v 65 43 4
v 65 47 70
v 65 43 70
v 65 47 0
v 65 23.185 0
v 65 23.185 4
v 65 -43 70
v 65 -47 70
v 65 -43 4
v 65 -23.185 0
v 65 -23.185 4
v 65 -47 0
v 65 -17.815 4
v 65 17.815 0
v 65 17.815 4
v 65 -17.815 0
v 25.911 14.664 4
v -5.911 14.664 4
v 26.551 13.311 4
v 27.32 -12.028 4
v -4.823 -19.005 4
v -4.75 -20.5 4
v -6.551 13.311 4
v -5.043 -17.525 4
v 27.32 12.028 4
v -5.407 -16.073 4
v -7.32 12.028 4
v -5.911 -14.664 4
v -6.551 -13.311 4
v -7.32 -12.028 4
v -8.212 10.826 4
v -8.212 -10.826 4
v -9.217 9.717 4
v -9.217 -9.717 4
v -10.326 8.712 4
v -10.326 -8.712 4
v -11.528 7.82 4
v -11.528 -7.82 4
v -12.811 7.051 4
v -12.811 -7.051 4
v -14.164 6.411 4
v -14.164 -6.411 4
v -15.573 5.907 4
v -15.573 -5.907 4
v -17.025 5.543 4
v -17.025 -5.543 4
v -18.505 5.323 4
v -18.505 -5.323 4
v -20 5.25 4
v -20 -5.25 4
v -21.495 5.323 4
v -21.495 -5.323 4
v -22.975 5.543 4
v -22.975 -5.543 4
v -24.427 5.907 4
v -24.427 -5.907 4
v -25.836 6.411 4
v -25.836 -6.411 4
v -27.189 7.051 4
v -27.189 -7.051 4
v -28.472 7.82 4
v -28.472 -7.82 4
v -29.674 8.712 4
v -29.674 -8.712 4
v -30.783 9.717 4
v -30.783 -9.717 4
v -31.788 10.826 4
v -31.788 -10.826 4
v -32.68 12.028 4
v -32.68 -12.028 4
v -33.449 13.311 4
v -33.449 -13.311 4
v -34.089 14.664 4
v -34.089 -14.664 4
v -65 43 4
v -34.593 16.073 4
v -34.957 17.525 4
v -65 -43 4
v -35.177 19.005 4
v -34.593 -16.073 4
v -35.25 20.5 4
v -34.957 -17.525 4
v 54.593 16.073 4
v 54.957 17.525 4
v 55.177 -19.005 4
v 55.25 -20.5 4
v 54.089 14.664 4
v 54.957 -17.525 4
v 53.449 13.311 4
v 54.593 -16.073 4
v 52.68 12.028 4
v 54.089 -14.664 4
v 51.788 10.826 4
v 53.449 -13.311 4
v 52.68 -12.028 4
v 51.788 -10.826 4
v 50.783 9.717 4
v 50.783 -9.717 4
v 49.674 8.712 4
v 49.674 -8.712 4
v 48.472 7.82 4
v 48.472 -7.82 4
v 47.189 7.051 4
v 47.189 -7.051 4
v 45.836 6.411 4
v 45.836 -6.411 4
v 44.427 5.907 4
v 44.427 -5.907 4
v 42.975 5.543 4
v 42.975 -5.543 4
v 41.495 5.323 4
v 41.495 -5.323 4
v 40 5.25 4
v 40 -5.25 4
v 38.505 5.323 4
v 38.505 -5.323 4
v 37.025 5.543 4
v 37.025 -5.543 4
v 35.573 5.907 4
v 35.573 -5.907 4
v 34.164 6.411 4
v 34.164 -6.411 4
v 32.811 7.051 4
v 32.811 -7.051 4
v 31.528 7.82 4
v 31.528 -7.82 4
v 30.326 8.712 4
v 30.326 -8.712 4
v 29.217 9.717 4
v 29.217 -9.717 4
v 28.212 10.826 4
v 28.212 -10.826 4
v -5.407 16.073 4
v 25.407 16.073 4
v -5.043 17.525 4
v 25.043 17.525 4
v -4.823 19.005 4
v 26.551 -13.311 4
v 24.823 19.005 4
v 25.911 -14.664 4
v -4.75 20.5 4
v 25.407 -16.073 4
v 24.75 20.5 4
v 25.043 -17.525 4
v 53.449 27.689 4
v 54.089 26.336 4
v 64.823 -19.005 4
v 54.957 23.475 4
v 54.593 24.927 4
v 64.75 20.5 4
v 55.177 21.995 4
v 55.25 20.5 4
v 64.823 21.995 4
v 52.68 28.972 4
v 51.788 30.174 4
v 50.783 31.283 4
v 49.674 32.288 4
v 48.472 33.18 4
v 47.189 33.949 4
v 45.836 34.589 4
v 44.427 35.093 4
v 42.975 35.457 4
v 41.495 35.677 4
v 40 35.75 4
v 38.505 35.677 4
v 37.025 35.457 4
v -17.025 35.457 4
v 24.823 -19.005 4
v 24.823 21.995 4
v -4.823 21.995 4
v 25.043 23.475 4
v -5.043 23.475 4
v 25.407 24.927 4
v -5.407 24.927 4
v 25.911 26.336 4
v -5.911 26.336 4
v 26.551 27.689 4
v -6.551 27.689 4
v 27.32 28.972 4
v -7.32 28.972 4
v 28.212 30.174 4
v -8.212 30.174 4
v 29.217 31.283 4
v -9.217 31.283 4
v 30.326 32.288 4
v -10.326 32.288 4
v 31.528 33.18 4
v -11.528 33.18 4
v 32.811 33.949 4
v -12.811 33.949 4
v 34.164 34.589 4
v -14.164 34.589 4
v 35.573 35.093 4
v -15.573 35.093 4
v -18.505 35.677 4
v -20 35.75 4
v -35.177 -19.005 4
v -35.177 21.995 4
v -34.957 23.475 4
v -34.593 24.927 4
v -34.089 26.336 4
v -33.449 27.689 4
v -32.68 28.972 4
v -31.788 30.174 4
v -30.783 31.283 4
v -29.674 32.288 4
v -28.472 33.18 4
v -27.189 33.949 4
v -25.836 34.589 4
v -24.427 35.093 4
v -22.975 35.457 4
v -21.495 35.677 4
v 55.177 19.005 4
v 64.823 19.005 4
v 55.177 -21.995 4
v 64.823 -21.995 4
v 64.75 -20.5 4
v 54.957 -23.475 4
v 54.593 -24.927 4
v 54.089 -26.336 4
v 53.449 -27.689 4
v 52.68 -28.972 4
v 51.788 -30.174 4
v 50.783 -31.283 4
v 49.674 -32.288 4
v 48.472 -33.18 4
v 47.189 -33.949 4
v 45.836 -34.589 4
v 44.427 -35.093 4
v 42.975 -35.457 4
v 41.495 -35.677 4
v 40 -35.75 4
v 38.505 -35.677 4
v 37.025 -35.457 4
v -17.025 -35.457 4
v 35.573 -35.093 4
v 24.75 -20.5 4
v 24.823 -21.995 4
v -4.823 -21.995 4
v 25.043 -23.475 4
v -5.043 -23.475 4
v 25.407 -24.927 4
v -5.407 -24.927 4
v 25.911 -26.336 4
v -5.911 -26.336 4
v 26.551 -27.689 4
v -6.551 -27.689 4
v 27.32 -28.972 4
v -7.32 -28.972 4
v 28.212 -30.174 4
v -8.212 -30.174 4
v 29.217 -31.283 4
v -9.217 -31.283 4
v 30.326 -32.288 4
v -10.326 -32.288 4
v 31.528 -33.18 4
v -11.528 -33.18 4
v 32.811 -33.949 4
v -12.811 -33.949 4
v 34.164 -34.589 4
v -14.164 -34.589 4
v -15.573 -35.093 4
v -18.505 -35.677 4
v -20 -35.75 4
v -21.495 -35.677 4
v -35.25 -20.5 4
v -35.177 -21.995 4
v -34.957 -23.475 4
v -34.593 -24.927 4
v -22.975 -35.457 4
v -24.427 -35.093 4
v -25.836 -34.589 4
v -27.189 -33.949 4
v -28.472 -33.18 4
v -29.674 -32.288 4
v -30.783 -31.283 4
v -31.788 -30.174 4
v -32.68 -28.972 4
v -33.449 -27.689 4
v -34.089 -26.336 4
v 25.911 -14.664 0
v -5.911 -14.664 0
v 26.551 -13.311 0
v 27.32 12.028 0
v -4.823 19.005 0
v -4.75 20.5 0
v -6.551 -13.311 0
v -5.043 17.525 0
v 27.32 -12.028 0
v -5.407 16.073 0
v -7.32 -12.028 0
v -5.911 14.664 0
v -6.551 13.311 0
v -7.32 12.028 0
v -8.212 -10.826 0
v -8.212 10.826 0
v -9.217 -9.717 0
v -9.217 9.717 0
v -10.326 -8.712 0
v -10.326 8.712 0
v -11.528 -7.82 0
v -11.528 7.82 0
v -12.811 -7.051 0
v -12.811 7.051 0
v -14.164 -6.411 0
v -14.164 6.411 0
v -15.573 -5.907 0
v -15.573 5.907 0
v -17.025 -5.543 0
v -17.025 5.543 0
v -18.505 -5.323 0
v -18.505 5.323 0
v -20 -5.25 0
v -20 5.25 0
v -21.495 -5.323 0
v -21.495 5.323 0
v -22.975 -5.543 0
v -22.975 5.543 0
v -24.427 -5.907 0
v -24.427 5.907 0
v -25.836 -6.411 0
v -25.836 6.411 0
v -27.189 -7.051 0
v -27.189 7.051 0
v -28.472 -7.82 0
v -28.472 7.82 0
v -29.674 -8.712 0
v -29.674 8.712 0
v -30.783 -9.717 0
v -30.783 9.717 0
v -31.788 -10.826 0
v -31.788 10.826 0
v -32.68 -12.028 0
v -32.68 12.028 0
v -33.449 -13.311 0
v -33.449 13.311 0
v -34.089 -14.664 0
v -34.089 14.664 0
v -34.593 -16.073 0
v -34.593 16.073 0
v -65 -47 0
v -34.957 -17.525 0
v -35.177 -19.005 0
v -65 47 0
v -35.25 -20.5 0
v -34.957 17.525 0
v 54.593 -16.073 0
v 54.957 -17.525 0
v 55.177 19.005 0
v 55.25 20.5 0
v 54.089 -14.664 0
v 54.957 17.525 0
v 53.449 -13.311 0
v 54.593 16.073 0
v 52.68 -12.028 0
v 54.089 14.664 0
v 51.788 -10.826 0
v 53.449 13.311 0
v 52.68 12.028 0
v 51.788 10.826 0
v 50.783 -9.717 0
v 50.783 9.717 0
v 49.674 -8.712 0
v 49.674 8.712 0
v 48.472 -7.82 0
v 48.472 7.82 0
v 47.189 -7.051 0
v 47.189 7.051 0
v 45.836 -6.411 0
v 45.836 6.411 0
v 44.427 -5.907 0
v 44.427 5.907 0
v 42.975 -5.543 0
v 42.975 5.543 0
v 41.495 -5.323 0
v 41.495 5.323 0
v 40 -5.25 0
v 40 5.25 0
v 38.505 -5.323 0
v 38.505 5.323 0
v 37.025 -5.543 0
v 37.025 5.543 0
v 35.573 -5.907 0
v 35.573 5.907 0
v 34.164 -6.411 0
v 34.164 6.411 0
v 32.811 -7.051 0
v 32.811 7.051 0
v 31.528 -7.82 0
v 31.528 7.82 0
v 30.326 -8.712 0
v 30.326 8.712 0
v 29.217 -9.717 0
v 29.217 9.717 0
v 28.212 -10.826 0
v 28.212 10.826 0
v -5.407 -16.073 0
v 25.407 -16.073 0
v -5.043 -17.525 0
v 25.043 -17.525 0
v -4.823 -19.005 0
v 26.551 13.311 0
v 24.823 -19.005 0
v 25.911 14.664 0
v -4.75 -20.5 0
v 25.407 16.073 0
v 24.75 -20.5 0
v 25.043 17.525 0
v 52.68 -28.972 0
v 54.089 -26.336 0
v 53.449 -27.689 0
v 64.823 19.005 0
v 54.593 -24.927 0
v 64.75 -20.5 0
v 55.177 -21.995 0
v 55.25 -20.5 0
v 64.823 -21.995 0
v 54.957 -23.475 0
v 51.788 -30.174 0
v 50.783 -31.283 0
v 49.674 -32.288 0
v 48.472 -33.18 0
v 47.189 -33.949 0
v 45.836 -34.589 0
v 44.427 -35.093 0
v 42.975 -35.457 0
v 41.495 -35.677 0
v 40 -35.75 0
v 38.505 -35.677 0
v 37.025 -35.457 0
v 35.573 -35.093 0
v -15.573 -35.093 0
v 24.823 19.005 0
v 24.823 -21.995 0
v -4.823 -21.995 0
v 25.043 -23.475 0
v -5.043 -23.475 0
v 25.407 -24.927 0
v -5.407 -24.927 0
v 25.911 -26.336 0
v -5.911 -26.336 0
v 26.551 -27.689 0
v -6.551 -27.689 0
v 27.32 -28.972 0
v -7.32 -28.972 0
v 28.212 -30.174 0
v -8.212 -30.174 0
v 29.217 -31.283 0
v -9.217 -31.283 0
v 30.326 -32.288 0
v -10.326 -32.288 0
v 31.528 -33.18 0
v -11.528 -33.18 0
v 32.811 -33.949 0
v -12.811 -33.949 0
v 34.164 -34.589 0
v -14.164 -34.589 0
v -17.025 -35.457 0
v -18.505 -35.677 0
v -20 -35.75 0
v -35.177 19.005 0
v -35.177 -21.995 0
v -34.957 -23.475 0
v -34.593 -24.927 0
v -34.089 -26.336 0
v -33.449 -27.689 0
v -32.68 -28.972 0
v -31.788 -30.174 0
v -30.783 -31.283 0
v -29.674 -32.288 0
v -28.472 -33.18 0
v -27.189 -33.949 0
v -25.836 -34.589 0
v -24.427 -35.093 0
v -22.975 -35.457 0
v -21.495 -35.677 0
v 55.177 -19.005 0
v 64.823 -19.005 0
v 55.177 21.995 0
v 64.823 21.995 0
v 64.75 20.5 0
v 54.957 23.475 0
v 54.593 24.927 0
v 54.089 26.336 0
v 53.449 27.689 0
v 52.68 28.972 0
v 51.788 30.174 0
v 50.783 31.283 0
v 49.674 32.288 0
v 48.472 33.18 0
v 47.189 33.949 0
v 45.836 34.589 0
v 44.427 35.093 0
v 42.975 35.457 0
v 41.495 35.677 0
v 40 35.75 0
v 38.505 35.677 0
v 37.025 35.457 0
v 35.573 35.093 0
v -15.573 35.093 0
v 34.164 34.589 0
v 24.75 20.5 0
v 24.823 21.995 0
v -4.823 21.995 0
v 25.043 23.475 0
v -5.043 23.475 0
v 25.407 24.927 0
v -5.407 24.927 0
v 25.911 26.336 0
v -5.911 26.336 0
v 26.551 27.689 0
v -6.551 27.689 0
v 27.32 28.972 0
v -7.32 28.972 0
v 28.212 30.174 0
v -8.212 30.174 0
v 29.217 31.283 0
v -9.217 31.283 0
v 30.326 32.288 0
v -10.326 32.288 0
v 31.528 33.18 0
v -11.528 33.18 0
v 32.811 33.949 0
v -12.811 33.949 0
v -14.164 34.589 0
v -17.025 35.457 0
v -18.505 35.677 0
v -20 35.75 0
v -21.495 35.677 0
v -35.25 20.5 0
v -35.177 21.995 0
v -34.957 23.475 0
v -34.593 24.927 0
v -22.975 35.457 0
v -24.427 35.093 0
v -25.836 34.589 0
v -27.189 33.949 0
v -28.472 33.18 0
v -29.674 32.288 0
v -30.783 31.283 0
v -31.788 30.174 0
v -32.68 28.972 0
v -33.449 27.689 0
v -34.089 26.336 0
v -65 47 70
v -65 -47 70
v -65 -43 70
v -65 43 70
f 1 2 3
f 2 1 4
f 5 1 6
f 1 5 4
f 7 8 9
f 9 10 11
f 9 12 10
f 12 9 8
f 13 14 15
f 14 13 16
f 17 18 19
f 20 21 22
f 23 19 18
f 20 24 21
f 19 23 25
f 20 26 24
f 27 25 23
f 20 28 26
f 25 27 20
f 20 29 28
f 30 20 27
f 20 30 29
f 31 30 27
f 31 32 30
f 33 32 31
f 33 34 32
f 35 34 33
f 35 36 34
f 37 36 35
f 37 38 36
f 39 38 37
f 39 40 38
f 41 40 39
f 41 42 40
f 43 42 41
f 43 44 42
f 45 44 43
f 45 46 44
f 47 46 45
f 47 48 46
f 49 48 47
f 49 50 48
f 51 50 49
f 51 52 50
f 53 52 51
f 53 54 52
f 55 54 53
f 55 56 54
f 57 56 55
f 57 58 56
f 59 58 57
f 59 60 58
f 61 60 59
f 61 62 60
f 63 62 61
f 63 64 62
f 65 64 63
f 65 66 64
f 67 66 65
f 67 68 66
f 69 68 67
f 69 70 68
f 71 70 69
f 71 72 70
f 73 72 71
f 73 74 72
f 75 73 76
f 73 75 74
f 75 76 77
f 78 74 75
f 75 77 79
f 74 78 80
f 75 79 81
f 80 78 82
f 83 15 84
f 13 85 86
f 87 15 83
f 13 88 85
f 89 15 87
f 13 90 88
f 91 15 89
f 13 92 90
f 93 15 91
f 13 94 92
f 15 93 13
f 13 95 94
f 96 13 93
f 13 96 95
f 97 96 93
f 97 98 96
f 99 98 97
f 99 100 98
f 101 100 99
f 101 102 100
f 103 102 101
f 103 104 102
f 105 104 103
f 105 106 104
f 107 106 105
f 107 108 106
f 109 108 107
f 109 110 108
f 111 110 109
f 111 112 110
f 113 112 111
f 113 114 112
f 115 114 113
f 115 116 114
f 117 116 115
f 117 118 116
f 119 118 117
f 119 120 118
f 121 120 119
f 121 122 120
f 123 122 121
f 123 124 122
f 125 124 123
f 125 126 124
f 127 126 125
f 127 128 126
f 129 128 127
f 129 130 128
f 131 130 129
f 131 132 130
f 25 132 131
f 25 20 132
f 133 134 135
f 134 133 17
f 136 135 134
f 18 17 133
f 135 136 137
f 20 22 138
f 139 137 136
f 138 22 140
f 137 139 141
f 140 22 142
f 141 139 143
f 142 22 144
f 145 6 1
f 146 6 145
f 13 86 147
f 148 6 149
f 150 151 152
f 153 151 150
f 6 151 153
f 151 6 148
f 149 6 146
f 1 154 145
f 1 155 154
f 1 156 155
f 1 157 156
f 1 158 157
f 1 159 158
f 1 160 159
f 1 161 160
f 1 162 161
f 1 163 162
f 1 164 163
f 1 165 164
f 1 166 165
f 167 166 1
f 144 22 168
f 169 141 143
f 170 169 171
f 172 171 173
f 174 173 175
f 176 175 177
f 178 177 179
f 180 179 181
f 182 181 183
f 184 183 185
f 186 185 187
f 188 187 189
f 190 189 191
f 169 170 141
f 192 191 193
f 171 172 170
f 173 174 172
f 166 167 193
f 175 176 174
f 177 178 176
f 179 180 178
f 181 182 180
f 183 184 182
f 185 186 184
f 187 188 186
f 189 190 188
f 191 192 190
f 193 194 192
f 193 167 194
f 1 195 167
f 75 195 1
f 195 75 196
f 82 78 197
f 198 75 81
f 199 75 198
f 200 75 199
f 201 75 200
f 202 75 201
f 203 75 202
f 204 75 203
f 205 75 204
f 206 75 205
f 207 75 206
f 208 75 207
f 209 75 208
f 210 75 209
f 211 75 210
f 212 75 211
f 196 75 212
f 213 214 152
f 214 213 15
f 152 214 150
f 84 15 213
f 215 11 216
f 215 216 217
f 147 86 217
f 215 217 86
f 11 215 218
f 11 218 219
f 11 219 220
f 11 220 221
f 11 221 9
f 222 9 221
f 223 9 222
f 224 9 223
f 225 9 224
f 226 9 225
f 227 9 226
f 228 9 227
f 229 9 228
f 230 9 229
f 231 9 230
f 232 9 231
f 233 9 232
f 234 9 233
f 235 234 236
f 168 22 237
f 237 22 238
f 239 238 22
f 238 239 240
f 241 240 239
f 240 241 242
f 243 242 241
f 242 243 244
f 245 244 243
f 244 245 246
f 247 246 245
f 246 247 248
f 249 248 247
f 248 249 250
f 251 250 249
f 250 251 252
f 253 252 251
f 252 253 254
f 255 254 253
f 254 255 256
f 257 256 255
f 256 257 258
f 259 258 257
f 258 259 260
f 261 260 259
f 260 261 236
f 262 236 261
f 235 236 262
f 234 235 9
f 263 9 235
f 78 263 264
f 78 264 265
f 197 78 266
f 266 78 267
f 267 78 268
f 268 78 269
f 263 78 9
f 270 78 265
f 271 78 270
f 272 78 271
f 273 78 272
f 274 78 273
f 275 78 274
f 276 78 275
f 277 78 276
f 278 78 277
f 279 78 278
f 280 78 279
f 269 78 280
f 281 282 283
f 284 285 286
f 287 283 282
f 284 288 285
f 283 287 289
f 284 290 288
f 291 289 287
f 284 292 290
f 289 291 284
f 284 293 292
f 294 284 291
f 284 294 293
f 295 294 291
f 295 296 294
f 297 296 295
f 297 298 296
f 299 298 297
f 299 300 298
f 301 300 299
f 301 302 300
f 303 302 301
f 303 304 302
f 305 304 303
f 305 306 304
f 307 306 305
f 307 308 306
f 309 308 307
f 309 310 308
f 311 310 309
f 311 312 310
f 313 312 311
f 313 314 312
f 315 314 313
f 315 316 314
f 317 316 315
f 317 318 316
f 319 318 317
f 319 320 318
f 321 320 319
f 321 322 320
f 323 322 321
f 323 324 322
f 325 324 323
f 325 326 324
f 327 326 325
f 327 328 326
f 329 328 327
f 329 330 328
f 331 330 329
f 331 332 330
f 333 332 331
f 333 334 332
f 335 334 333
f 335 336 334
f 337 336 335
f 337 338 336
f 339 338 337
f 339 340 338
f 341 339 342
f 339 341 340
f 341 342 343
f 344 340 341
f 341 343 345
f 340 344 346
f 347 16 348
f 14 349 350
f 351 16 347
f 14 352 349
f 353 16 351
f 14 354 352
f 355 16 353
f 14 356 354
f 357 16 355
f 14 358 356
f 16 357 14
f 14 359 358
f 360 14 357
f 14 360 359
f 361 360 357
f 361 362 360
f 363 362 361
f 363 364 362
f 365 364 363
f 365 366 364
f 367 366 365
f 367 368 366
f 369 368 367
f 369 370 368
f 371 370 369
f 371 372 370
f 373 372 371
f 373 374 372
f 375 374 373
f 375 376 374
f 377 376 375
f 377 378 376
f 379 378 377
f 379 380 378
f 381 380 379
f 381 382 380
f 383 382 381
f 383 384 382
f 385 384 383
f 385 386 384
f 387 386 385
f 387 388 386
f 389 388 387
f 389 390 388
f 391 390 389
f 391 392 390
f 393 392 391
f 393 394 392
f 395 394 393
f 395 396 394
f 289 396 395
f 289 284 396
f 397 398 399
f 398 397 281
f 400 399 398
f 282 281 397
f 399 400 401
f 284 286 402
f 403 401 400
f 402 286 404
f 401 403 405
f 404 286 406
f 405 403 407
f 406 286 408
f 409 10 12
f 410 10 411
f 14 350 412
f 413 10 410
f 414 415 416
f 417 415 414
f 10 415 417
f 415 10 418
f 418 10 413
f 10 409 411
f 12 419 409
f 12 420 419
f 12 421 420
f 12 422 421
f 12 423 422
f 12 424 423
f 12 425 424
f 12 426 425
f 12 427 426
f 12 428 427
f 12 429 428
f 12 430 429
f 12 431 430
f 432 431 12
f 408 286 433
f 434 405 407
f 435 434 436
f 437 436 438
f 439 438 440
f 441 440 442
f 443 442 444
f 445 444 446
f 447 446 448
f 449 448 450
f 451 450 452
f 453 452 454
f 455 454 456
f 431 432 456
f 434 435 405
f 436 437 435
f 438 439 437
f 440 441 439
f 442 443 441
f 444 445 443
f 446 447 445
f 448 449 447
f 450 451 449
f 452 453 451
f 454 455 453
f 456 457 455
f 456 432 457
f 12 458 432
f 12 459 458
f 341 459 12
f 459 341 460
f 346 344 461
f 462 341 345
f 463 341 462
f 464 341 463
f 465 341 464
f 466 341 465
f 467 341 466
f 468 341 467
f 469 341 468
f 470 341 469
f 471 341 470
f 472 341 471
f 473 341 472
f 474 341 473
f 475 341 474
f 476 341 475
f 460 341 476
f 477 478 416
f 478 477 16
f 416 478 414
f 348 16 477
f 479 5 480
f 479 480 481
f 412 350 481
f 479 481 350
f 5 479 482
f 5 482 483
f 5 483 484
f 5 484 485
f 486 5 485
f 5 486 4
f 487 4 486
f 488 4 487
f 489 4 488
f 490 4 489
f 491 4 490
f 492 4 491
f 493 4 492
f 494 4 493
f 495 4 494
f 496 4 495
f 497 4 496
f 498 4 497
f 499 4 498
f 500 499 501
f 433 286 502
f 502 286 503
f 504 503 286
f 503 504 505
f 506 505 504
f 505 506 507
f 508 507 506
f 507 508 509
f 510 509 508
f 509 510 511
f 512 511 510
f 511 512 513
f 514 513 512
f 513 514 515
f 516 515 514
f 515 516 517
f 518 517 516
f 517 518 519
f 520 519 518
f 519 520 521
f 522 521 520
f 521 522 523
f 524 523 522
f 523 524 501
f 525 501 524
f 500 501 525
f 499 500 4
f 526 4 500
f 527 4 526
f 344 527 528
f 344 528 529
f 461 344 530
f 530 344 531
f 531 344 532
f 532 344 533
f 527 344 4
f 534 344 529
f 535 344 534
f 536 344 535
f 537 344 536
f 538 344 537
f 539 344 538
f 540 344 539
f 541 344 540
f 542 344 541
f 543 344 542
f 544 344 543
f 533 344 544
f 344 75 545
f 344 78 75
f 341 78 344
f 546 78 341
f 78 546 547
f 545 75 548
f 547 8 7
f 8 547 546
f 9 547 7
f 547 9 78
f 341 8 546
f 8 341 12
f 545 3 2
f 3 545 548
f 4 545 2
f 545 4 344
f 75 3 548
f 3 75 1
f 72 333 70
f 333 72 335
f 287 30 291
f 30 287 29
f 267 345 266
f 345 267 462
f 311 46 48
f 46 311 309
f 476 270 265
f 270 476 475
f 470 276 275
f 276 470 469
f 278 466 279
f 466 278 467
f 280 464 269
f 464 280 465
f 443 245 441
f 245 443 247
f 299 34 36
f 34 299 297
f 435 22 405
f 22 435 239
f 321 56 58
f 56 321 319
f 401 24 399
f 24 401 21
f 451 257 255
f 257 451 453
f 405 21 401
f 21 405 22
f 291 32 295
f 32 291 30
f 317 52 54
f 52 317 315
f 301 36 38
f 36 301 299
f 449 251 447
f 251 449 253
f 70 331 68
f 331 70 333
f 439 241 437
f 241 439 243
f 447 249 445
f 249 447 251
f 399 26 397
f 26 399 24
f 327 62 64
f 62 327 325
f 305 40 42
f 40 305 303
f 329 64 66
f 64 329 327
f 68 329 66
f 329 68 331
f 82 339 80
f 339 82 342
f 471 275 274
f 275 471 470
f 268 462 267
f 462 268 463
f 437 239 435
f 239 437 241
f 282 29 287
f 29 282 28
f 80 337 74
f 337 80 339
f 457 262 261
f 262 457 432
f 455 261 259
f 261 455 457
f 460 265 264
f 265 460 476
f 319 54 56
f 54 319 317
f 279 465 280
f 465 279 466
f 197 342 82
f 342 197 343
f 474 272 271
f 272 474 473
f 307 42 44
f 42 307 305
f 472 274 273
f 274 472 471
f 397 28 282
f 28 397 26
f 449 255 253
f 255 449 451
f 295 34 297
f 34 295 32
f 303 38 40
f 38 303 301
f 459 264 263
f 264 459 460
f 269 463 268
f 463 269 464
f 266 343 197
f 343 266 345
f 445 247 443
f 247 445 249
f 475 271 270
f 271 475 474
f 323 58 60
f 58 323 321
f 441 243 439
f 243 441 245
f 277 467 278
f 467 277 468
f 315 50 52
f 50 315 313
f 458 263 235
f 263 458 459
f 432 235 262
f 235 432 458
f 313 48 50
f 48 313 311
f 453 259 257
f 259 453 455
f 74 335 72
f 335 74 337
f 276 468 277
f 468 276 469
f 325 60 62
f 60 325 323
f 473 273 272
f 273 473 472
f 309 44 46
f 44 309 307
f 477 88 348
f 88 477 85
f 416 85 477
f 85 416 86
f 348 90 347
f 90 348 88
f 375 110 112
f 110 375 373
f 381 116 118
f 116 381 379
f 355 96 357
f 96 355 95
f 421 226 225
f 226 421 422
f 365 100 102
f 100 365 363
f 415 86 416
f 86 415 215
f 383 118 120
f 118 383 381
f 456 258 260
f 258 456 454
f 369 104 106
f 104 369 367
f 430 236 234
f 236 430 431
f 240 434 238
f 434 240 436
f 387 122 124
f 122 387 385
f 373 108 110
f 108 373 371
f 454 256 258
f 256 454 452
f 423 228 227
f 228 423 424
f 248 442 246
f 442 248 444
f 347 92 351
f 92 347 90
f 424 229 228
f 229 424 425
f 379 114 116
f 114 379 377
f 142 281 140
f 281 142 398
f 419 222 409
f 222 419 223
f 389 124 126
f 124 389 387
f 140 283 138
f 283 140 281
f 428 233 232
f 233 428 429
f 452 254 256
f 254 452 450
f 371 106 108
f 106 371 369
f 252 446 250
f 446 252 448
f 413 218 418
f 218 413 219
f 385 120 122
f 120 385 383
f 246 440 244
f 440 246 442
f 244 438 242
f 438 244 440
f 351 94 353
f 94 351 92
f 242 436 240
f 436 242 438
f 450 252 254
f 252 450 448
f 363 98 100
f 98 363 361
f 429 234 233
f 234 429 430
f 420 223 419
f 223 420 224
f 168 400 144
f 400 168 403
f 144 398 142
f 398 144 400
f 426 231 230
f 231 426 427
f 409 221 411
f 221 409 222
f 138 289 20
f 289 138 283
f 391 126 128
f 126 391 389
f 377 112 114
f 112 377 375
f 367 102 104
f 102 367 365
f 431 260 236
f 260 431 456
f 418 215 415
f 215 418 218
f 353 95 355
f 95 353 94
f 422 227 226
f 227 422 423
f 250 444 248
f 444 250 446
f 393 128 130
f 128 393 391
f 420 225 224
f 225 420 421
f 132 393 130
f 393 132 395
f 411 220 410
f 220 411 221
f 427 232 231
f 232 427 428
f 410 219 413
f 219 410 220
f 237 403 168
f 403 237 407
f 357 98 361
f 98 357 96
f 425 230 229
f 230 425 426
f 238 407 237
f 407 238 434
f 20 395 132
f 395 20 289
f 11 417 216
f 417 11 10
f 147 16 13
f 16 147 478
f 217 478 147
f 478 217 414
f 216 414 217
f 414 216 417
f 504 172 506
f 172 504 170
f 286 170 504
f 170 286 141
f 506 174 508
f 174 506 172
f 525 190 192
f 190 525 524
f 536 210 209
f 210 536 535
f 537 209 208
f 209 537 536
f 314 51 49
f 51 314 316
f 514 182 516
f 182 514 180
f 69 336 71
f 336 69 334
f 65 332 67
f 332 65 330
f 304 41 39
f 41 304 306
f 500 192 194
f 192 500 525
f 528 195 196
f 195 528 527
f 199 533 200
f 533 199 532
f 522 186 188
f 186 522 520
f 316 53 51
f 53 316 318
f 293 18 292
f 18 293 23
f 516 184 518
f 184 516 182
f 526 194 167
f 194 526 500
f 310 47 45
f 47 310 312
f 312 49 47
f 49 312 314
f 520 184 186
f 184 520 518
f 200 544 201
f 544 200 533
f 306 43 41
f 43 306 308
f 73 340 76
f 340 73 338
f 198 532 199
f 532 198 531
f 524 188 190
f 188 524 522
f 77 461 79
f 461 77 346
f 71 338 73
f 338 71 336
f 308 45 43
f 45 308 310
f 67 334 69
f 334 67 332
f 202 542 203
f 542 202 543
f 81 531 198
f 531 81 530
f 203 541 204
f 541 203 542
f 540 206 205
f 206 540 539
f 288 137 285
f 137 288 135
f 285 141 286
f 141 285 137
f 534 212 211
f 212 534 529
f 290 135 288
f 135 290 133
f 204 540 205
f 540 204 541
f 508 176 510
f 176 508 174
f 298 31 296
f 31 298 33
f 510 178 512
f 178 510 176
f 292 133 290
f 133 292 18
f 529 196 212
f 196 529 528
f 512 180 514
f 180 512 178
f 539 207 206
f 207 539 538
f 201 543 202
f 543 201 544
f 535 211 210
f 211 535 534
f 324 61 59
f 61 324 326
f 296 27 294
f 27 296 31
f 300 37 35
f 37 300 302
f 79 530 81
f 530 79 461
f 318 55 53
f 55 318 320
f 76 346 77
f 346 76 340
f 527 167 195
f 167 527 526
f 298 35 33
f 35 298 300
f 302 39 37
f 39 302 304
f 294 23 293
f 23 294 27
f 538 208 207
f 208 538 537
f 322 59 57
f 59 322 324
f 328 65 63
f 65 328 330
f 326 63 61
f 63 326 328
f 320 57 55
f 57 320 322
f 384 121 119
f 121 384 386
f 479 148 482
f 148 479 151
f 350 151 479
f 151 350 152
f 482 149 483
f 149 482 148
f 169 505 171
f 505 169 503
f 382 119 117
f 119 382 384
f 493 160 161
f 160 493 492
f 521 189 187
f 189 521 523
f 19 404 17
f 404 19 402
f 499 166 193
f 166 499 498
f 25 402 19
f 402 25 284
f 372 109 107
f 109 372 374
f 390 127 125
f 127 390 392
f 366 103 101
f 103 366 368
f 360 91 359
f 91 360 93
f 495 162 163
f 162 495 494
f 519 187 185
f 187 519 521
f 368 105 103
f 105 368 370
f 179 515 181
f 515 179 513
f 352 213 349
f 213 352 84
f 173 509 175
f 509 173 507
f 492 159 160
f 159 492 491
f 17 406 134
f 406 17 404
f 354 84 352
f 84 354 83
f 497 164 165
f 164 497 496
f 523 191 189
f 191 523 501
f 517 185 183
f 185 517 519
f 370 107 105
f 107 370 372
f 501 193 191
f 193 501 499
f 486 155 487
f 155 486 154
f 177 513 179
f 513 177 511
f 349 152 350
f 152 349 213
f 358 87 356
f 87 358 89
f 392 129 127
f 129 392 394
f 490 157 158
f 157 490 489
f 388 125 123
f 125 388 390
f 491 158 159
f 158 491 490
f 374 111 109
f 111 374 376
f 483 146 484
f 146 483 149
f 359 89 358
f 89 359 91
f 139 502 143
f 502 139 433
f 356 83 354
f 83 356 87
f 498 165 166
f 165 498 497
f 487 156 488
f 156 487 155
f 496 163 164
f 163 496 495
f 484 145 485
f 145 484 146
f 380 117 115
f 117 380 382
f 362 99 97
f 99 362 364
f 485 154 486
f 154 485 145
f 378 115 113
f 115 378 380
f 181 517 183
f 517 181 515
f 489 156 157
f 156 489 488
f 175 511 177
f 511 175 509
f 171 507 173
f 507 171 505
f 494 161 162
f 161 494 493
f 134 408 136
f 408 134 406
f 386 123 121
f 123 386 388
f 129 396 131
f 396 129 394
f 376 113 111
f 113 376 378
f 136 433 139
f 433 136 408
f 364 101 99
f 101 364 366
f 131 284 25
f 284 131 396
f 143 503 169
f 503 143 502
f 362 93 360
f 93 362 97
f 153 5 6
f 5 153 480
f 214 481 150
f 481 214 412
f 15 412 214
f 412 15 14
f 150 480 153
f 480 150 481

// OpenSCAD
// Built by bench/smallmodels/features/compiler.py from a list of features.
$fn = 64;
difference() {
  union() {
    translate([0, 0, 0]) translate([-65, -45, 0]) cube([130, 90, 4]);
    translate([0, -45, 0]) translate([-65, -2, 0]) cube([130, 4, 70]);
    translate([0, 45, 0]) translate([-65, -2, 0]) cube([130, 4, 70]);
  }
  union() {
    translate([-20, -20.5, -1]) rotate([0, 0, 0]) cylinder(d = 30.5, h = 72);
    translate([40, -20.5, -1]) rotate([0, 0, 0]) cylinder(d = 30.5, h = 72);
    translate([80, -20.5, -1]) rotate([0, 0, 0]) cylinder(d = 30.5, h = 72);
    translate([-20, 20.5, -1]) rotate([0, 0, 0]) cylinder(d = 30.5, h = 72);
    translate([40, 20.5, -1]) rotate([0, 0, 0]) cylinder(d = 30.5, h = 72);
    translate([80, 20.5, -1]) rotate([0, 0, 0]) cylinder(d = 30.5, h = 72);
  }
}
